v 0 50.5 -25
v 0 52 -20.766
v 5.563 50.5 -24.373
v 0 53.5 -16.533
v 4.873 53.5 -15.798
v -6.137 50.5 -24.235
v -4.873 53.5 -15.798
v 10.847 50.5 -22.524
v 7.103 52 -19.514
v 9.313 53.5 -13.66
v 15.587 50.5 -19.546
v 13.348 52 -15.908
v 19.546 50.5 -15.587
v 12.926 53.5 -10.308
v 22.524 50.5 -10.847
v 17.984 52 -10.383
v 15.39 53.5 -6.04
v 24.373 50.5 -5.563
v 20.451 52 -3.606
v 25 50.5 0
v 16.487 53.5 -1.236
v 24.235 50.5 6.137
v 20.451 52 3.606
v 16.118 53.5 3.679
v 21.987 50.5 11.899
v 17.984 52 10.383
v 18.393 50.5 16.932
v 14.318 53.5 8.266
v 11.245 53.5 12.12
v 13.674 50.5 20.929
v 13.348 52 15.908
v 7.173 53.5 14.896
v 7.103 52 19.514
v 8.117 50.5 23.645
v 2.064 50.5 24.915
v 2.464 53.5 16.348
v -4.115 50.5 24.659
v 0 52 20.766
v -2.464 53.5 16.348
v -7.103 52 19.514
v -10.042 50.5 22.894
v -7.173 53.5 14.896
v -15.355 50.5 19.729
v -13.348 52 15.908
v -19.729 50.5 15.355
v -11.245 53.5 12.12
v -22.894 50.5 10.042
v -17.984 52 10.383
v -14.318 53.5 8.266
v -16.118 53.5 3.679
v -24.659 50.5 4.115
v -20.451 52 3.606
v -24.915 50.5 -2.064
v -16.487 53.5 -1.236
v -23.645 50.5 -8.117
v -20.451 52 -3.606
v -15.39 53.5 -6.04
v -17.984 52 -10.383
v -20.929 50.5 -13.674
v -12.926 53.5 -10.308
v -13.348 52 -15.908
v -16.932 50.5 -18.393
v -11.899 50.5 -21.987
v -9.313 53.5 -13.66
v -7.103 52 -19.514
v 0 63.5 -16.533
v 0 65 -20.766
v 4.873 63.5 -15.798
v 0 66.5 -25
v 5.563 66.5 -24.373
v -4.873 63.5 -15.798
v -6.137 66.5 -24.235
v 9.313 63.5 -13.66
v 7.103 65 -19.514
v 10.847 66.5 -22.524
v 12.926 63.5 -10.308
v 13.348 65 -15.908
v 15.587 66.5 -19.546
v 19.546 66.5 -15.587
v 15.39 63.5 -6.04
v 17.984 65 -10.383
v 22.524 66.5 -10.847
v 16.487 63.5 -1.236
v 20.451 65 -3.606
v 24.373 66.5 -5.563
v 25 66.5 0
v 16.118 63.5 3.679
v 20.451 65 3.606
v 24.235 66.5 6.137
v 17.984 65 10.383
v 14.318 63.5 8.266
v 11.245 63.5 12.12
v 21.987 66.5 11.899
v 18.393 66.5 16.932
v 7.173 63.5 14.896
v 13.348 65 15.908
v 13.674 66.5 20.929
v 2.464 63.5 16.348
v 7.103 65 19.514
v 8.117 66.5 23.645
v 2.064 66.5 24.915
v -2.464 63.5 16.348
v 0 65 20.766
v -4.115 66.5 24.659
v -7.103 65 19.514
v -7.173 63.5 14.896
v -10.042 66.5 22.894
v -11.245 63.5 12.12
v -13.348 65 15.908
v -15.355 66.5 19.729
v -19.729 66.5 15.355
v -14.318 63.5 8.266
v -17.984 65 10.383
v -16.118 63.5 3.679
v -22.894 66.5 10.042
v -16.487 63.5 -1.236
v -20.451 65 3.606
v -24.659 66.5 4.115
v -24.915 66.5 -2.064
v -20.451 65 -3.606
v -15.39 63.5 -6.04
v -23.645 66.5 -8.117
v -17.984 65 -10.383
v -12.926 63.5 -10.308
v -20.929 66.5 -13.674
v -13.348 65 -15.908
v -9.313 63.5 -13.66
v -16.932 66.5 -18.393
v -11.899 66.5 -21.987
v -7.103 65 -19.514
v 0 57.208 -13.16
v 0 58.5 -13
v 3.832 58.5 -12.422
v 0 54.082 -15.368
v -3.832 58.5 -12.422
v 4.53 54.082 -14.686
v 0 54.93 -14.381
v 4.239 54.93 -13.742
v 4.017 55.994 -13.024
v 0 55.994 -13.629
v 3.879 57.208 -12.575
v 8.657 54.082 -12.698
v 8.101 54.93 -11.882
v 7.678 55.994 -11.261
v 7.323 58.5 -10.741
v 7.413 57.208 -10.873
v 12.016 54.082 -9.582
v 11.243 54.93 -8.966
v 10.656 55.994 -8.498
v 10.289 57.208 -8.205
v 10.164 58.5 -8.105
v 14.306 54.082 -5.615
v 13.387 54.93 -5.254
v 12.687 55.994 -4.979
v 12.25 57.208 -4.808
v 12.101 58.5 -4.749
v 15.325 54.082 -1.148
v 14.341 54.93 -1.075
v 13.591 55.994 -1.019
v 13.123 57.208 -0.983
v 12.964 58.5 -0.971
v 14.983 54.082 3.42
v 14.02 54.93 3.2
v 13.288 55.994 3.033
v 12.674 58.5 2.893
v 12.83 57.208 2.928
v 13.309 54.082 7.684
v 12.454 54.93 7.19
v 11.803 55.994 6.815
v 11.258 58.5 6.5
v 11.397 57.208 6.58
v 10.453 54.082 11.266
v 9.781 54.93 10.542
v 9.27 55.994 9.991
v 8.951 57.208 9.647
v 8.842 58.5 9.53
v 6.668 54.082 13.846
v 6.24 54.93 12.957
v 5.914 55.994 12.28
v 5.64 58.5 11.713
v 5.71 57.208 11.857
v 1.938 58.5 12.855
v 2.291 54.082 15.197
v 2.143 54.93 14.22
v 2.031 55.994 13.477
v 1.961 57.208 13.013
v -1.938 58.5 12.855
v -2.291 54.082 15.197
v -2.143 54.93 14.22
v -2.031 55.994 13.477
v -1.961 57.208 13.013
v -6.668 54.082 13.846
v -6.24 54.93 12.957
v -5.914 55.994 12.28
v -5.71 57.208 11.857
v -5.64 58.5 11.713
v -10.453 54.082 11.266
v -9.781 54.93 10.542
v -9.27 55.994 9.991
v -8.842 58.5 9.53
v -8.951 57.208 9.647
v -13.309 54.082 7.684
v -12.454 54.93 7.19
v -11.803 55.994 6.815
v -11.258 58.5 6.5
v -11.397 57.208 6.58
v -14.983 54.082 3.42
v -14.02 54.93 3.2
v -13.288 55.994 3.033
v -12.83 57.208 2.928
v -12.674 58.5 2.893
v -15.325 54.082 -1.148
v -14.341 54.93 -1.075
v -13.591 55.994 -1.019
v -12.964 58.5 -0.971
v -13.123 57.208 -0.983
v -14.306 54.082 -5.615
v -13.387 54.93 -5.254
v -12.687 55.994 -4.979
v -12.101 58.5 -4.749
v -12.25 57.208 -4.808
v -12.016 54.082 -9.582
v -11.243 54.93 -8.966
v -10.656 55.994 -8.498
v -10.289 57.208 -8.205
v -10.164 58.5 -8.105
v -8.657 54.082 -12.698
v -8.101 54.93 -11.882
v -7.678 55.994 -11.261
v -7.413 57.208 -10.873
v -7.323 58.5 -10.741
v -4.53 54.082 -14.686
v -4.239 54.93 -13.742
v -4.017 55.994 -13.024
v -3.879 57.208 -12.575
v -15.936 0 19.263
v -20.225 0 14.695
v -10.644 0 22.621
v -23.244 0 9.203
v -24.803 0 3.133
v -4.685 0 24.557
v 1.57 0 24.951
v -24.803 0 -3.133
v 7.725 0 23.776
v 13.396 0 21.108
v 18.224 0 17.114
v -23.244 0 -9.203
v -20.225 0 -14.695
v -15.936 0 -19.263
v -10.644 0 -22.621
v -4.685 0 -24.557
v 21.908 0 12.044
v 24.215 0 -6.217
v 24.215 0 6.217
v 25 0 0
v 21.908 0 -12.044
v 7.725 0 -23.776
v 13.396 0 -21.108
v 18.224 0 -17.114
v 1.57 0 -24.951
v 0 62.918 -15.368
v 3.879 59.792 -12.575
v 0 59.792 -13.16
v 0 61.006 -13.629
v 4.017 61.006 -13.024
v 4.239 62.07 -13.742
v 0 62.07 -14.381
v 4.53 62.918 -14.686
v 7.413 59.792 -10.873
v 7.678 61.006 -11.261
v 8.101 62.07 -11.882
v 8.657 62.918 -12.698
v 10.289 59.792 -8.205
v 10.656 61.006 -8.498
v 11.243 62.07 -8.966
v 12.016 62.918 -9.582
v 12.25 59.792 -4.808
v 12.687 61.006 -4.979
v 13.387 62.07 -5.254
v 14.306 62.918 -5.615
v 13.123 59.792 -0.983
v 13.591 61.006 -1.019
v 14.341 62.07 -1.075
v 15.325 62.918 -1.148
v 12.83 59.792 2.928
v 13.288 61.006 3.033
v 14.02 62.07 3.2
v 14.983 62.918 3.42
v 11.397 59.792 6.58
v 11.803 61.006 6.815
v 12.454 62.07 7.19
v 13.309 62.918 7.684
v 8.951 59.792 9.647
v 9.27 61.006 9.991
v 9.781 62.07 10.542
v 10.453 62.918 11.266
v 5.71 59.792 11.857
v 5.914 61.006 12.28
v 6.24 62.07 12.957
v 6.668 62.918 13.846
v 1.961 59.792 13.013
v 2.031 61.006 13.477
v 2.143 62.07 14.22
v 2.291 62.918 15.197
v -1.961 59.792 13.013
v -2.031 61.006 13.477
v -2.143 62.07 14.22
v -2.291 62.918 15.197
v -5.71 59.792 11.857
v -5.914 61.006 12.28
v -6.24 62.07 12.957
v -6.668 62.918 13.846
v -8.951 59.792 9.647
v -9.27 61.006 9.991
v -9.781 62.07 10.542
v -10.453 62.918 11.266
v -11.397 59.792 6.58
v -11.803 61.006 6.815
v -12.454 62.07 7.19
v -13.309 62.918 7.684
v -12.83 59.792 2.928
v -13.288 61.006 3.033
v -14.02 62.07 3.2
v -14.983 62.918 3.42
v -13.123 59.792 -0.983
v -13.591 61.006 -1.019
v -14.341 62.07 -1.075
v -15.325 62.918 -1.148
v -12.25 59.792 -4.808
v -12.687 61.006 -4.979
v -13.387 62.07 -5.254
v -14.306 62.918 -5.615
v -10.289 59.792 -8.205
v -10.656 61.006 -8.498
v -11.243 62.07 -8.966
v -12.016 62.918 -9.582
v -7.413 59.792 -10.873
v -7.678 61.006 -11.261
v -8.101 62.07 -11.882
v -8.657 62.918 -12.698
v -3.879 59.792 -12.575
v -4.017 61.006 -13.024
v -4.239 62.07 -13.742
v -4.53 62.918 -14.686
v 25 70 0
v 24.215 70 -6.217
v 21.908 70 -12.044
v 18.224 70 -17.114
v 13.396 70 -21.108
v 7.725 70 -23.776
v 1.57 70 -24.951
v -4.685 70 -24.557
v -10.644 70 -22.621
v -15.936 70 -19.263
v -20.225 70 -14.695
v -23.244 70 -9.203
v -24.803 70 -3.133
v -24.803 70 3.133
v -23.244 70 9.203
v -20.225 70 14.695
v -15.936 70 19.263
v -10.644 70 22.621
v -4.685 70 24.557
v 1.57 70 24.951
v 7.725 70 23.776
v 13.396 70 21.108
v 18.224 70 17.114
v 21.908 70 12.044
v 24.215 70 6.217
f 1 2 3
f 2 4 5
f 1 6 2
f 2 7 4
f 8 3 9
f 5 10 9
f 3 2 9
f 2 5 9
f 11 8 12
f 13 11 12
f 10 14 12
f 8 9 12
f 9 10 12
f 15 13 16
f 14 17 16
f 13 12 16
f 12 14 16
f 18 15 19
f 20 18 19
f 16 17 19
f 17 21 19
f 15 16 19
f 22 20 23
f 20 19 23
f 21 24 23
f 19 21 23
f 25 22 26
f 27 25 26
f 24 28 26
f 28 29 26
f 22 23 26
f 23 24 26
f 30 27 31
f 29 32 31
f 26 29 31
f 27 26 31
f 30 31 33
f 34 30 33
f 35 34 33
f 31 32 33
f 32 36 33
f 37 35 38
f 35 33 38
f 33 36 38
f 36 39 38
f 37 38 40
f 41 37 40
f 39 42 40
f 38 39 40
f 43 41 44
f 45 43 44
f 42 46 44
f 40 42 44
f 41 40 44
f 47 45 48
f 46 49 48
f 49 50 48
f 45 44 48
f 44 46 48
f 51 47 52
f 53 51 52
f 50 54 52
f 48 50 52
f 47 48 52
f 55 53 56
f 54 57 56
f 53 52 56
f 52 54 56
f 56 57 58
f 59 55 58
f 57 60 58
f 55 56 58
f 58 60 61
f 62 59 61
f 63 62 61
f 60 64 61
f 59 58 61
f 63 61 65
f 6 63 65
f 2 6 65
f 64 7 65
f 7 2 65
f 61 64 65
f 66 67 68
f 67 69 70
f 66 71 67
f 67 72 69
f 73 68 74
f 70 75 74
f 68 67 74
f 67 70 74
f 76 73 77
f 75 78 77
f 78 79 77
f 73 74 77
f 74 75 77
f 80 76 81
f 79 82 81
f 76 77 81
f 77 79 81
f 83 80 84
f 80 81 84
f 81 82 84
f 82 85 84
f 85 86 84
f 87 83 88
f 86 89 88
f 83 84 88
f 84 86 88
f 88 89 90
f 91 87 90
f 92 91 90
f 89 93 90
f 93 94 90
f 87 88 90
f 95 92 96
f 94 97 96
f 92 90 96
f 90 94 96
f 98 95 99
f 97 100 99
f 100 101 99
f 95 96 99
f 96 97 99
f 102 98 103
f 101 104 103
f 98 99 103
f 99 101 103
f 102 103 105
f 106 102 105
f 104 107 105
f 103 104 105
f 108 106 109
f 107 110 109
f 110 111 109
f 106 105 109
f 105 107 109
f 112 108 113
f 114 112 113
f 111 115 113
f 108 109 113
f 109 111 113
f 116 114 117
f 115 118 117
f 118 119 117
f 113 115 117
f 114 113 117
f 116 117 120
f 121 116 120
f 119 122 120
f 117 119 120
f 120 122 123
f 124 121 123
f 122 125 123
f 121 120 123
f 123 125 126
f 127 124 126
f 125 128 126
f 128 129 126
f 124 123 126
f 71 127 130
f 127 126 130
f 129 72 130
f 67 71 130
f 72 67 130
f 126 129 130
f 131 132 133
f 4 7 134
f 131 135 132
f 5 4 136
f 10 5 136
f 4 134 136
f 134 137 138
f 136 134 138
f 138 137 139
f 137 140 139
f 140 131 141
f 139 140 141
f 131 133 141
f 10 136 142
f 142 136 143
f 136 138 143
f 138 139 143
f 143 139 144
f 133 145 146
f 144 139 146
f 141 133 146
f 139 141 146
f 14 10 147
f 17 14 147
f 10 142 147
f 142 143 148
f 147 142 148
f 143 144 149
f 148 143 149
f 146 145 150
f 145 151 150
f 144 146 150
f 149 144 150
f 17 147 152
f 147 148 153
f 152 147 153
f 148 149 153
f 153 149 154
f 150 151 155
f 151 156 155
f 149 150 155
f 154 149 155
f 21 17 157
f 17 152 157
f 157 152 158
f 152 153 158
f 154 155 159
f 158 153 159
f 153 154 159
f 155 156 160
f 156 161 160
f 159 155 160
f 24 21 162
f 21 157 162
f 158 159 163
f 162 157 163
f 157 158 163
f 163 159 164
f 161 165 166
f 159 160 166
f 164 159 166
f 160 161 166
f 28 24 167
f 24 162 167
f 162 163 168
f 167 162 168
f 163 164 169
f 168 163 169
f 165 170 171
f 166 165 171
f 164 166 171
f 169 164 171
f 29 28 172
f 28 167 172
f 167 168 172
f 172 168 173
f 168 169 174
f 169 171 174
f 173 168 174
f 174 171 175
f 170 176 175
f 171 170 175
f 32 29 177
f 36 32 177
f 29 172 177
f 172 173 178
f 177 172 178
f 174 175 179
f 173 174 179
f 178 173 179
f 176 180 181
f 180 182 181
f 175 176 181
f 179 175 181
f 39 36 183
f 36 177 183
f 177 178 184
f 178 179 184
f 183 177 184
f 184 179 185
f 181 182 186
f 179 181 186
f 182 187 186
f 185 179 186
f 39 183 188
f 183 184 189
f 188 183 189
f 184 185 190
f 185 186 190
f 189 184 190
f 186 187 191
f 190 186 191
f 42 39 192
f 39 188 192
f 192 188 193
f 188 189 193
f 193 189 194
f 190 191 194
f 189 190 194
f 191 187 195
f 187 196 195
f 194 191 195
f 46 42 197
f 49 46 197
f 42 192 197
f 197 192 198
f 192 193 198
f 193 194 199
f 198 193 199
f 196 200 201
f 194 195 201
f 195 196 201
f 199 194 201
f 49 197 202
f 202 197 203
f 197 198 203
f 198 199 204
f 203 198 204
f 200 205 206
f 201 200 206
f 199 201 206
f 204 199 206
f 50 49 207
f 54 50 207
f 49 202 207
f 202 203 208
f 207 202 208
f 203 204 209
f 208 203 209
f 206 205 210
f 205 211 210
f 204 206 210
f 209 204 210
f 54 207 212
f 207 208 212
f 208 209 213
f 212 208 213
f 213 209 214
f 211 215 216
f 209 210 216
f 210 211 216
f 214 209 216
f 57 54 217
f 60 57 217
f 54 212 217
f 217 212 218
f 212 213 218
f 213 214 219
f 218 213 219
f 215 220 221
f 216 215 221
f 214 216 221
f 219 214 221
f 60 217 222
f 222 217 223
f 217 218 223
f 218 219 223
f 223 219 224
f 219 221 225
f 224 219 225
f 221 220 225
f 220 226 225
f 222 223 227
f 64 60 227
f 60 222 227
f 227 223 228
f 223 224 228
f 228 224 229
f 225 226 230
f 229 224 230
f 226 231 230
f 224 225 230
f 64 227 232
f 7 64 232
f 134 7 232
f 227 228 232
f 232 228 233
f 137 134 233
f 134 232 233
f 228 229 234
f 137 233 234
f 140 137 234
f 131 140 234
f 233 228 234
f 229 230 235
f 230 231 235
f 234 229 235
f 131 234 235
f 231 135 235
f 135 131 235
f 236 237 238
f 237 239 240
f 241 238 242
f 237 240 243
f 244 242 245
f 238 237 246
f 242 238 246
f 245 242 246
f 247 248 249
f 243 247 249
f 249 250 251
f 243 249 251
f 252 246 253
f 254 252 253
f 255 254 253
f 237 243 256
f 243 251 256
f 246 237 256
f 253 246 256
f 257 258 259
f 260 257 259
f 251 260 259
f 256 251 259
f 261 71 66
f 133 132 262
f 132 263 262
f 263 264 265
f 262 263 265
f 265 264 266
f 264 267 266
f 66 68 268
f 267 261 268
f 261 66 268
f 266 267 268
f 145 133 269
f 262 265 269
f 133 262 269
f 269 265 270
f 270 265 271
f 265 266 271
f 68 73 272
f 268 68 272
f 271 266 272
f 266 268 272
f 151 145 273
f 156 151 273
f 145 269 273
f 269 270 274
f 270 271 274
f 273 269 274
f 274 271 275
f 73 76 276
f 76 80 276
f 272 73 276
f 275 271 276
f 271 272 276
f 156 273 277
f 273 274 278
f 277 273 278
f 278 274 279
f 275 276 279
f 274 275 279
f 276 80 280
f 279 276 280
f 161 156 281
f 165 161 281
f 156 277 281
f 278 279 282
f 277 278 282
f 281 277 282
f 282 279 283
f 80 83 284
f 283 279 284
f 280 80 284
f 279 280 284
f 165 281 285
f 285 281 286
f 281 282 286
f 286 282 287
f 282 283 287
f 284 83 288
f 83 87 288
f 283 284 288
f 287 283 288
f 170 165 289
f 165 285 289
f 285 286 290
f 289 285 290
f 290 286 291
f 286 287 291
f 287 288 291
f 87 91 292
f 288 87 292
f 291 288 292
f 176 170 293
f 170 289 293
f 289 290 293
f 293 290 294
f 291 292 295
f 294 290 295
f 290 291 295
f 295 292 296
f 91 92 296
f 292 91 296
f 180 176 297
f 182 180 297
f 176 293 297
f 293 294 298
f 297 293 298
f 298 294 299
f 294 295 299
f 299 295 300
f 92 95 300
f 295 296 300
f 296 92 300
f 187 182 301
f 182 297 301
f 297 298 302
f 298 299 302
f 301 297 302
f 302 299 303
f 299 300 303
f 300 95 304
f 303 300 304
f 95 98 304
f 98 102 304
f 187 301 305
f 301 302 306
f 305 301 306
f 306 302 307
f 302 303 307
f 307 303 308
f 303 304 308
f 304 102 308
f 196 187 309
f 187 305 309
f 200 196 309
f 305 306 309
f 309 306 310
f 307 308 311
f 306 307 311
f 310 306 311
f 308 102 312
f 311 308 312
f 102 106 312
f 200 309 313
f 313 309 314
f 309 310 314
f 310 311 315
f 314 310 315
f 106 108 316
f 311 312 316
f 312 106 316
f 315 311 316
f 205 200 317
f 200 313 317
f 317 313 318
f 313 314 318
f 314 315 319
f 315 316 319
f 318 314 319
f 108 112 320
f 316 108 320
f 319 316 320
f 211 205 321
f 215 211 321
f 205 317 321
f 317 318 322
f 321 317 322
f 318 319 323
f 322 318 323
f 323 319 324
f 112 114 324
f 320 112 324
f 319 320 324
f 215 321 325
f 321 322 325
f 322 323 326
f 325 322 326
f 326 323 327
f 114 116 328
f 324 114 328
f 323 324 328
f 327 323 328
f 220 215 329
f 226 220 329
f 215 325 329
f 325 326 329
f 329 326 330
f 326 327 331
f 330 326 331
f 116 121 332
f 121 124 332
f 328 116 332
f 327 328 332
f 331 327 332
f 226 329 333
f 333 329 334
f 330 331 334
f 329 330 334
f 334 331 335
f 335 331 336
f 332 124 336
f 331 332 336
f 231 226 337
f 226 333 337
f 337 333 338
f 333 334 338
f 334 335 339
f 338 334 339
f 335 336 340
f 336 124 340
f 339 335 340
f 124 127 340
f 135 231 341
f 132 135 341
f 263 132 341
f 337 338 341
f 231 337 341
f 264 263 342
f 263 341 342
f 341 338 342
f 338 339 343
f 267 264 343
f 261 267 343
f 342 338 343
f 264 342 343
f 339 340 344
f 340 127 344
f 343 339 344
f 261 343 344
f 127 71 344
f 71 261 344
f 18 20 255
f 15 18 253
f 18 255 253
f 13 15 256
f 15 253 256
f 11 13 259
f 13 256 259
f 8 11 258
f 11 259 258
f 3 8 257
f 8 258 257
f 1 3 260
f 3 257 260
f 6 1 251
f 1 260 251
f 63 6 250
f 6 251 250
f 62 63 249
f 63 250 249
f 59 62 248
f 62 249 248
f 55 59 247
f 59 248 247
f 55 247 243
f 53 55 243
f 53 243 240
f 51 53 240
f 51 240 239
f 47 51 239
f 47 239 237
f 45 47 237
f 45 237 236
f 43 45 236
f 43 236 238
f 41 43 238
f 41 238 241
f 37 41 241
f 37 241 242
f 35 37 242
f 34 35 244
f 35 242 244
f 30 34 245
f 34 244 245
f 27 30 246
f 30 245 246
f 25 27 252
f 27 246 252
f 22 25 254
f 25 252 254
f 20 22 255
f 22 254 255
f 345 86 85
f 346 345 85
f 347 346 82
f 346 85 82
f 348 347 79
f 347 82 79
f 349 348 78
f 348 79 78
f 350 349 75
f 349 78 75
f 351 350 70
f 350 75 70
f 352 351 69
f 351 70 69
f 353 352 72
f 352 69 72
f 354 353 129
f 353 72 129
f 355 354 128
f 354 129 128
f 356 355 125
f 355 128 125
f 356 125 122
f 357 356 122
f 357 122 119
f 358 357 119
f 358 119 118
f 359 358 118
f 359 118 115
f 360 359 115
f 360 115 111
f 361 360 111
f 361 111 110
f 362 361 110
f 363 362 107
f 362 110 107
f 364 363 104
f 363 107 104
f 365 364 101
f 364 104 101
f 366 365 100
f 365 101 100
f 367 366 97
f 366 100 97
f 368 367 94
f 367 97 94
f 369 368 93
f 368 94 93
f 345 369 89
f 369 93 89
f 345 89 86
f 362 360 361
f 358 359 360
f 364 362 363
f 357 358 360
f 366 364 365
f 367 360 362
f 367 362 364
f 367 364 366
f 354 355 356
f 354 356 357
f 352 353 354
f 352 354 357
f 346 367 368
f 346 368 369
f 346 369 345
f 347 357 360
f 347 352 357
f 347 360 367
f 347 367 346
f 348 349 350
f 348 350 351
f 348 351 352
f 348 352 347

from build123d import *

# Parameters (mm, degrees)
SKETCH1_R           = 25
BOSS_EXTRUDE1_DEPTH = 70


with BuildPart() as part:
    # Sketch1 → Boss-Extrude1 (new body)
    with BuildSketch(Plane(origin=(0, 0, 0), x_dir=(1, 0, 0), z_dir=(0, 1, 0))):
        Circle(SKETCH1_R)
    extrude(amount=BOSS_EXTRUDE1_DEPTH)

    # Sketch2 → Cut-Revolve1 (revolve, cut)
    with BuildSketch(Plane(origin=(0, 0, 0), x_dir=(0, 0, -1), z_dir=(1, 0, 0))):
        with BuildLine():
            Line((25, 50.5), (16.532991719, 53.5))
            ThreePointArc((16.532991719, 53.5), (13.972369333, 55.438871512), (13, 58.5))
            ThreePointArc((13, 58.5), (13.972369333, 61.561128488), (16.532991719, 63.5))
            Line((16.532991719, 63.5), (25, 66.5))
            Line((25, 66.5), (25, 50.5))
        make_face()
    revolve(axis=Axis((0, 73.5, 0), (0, -1, 0)), mode=Mode.SUBTRACT)


solid = part.part
